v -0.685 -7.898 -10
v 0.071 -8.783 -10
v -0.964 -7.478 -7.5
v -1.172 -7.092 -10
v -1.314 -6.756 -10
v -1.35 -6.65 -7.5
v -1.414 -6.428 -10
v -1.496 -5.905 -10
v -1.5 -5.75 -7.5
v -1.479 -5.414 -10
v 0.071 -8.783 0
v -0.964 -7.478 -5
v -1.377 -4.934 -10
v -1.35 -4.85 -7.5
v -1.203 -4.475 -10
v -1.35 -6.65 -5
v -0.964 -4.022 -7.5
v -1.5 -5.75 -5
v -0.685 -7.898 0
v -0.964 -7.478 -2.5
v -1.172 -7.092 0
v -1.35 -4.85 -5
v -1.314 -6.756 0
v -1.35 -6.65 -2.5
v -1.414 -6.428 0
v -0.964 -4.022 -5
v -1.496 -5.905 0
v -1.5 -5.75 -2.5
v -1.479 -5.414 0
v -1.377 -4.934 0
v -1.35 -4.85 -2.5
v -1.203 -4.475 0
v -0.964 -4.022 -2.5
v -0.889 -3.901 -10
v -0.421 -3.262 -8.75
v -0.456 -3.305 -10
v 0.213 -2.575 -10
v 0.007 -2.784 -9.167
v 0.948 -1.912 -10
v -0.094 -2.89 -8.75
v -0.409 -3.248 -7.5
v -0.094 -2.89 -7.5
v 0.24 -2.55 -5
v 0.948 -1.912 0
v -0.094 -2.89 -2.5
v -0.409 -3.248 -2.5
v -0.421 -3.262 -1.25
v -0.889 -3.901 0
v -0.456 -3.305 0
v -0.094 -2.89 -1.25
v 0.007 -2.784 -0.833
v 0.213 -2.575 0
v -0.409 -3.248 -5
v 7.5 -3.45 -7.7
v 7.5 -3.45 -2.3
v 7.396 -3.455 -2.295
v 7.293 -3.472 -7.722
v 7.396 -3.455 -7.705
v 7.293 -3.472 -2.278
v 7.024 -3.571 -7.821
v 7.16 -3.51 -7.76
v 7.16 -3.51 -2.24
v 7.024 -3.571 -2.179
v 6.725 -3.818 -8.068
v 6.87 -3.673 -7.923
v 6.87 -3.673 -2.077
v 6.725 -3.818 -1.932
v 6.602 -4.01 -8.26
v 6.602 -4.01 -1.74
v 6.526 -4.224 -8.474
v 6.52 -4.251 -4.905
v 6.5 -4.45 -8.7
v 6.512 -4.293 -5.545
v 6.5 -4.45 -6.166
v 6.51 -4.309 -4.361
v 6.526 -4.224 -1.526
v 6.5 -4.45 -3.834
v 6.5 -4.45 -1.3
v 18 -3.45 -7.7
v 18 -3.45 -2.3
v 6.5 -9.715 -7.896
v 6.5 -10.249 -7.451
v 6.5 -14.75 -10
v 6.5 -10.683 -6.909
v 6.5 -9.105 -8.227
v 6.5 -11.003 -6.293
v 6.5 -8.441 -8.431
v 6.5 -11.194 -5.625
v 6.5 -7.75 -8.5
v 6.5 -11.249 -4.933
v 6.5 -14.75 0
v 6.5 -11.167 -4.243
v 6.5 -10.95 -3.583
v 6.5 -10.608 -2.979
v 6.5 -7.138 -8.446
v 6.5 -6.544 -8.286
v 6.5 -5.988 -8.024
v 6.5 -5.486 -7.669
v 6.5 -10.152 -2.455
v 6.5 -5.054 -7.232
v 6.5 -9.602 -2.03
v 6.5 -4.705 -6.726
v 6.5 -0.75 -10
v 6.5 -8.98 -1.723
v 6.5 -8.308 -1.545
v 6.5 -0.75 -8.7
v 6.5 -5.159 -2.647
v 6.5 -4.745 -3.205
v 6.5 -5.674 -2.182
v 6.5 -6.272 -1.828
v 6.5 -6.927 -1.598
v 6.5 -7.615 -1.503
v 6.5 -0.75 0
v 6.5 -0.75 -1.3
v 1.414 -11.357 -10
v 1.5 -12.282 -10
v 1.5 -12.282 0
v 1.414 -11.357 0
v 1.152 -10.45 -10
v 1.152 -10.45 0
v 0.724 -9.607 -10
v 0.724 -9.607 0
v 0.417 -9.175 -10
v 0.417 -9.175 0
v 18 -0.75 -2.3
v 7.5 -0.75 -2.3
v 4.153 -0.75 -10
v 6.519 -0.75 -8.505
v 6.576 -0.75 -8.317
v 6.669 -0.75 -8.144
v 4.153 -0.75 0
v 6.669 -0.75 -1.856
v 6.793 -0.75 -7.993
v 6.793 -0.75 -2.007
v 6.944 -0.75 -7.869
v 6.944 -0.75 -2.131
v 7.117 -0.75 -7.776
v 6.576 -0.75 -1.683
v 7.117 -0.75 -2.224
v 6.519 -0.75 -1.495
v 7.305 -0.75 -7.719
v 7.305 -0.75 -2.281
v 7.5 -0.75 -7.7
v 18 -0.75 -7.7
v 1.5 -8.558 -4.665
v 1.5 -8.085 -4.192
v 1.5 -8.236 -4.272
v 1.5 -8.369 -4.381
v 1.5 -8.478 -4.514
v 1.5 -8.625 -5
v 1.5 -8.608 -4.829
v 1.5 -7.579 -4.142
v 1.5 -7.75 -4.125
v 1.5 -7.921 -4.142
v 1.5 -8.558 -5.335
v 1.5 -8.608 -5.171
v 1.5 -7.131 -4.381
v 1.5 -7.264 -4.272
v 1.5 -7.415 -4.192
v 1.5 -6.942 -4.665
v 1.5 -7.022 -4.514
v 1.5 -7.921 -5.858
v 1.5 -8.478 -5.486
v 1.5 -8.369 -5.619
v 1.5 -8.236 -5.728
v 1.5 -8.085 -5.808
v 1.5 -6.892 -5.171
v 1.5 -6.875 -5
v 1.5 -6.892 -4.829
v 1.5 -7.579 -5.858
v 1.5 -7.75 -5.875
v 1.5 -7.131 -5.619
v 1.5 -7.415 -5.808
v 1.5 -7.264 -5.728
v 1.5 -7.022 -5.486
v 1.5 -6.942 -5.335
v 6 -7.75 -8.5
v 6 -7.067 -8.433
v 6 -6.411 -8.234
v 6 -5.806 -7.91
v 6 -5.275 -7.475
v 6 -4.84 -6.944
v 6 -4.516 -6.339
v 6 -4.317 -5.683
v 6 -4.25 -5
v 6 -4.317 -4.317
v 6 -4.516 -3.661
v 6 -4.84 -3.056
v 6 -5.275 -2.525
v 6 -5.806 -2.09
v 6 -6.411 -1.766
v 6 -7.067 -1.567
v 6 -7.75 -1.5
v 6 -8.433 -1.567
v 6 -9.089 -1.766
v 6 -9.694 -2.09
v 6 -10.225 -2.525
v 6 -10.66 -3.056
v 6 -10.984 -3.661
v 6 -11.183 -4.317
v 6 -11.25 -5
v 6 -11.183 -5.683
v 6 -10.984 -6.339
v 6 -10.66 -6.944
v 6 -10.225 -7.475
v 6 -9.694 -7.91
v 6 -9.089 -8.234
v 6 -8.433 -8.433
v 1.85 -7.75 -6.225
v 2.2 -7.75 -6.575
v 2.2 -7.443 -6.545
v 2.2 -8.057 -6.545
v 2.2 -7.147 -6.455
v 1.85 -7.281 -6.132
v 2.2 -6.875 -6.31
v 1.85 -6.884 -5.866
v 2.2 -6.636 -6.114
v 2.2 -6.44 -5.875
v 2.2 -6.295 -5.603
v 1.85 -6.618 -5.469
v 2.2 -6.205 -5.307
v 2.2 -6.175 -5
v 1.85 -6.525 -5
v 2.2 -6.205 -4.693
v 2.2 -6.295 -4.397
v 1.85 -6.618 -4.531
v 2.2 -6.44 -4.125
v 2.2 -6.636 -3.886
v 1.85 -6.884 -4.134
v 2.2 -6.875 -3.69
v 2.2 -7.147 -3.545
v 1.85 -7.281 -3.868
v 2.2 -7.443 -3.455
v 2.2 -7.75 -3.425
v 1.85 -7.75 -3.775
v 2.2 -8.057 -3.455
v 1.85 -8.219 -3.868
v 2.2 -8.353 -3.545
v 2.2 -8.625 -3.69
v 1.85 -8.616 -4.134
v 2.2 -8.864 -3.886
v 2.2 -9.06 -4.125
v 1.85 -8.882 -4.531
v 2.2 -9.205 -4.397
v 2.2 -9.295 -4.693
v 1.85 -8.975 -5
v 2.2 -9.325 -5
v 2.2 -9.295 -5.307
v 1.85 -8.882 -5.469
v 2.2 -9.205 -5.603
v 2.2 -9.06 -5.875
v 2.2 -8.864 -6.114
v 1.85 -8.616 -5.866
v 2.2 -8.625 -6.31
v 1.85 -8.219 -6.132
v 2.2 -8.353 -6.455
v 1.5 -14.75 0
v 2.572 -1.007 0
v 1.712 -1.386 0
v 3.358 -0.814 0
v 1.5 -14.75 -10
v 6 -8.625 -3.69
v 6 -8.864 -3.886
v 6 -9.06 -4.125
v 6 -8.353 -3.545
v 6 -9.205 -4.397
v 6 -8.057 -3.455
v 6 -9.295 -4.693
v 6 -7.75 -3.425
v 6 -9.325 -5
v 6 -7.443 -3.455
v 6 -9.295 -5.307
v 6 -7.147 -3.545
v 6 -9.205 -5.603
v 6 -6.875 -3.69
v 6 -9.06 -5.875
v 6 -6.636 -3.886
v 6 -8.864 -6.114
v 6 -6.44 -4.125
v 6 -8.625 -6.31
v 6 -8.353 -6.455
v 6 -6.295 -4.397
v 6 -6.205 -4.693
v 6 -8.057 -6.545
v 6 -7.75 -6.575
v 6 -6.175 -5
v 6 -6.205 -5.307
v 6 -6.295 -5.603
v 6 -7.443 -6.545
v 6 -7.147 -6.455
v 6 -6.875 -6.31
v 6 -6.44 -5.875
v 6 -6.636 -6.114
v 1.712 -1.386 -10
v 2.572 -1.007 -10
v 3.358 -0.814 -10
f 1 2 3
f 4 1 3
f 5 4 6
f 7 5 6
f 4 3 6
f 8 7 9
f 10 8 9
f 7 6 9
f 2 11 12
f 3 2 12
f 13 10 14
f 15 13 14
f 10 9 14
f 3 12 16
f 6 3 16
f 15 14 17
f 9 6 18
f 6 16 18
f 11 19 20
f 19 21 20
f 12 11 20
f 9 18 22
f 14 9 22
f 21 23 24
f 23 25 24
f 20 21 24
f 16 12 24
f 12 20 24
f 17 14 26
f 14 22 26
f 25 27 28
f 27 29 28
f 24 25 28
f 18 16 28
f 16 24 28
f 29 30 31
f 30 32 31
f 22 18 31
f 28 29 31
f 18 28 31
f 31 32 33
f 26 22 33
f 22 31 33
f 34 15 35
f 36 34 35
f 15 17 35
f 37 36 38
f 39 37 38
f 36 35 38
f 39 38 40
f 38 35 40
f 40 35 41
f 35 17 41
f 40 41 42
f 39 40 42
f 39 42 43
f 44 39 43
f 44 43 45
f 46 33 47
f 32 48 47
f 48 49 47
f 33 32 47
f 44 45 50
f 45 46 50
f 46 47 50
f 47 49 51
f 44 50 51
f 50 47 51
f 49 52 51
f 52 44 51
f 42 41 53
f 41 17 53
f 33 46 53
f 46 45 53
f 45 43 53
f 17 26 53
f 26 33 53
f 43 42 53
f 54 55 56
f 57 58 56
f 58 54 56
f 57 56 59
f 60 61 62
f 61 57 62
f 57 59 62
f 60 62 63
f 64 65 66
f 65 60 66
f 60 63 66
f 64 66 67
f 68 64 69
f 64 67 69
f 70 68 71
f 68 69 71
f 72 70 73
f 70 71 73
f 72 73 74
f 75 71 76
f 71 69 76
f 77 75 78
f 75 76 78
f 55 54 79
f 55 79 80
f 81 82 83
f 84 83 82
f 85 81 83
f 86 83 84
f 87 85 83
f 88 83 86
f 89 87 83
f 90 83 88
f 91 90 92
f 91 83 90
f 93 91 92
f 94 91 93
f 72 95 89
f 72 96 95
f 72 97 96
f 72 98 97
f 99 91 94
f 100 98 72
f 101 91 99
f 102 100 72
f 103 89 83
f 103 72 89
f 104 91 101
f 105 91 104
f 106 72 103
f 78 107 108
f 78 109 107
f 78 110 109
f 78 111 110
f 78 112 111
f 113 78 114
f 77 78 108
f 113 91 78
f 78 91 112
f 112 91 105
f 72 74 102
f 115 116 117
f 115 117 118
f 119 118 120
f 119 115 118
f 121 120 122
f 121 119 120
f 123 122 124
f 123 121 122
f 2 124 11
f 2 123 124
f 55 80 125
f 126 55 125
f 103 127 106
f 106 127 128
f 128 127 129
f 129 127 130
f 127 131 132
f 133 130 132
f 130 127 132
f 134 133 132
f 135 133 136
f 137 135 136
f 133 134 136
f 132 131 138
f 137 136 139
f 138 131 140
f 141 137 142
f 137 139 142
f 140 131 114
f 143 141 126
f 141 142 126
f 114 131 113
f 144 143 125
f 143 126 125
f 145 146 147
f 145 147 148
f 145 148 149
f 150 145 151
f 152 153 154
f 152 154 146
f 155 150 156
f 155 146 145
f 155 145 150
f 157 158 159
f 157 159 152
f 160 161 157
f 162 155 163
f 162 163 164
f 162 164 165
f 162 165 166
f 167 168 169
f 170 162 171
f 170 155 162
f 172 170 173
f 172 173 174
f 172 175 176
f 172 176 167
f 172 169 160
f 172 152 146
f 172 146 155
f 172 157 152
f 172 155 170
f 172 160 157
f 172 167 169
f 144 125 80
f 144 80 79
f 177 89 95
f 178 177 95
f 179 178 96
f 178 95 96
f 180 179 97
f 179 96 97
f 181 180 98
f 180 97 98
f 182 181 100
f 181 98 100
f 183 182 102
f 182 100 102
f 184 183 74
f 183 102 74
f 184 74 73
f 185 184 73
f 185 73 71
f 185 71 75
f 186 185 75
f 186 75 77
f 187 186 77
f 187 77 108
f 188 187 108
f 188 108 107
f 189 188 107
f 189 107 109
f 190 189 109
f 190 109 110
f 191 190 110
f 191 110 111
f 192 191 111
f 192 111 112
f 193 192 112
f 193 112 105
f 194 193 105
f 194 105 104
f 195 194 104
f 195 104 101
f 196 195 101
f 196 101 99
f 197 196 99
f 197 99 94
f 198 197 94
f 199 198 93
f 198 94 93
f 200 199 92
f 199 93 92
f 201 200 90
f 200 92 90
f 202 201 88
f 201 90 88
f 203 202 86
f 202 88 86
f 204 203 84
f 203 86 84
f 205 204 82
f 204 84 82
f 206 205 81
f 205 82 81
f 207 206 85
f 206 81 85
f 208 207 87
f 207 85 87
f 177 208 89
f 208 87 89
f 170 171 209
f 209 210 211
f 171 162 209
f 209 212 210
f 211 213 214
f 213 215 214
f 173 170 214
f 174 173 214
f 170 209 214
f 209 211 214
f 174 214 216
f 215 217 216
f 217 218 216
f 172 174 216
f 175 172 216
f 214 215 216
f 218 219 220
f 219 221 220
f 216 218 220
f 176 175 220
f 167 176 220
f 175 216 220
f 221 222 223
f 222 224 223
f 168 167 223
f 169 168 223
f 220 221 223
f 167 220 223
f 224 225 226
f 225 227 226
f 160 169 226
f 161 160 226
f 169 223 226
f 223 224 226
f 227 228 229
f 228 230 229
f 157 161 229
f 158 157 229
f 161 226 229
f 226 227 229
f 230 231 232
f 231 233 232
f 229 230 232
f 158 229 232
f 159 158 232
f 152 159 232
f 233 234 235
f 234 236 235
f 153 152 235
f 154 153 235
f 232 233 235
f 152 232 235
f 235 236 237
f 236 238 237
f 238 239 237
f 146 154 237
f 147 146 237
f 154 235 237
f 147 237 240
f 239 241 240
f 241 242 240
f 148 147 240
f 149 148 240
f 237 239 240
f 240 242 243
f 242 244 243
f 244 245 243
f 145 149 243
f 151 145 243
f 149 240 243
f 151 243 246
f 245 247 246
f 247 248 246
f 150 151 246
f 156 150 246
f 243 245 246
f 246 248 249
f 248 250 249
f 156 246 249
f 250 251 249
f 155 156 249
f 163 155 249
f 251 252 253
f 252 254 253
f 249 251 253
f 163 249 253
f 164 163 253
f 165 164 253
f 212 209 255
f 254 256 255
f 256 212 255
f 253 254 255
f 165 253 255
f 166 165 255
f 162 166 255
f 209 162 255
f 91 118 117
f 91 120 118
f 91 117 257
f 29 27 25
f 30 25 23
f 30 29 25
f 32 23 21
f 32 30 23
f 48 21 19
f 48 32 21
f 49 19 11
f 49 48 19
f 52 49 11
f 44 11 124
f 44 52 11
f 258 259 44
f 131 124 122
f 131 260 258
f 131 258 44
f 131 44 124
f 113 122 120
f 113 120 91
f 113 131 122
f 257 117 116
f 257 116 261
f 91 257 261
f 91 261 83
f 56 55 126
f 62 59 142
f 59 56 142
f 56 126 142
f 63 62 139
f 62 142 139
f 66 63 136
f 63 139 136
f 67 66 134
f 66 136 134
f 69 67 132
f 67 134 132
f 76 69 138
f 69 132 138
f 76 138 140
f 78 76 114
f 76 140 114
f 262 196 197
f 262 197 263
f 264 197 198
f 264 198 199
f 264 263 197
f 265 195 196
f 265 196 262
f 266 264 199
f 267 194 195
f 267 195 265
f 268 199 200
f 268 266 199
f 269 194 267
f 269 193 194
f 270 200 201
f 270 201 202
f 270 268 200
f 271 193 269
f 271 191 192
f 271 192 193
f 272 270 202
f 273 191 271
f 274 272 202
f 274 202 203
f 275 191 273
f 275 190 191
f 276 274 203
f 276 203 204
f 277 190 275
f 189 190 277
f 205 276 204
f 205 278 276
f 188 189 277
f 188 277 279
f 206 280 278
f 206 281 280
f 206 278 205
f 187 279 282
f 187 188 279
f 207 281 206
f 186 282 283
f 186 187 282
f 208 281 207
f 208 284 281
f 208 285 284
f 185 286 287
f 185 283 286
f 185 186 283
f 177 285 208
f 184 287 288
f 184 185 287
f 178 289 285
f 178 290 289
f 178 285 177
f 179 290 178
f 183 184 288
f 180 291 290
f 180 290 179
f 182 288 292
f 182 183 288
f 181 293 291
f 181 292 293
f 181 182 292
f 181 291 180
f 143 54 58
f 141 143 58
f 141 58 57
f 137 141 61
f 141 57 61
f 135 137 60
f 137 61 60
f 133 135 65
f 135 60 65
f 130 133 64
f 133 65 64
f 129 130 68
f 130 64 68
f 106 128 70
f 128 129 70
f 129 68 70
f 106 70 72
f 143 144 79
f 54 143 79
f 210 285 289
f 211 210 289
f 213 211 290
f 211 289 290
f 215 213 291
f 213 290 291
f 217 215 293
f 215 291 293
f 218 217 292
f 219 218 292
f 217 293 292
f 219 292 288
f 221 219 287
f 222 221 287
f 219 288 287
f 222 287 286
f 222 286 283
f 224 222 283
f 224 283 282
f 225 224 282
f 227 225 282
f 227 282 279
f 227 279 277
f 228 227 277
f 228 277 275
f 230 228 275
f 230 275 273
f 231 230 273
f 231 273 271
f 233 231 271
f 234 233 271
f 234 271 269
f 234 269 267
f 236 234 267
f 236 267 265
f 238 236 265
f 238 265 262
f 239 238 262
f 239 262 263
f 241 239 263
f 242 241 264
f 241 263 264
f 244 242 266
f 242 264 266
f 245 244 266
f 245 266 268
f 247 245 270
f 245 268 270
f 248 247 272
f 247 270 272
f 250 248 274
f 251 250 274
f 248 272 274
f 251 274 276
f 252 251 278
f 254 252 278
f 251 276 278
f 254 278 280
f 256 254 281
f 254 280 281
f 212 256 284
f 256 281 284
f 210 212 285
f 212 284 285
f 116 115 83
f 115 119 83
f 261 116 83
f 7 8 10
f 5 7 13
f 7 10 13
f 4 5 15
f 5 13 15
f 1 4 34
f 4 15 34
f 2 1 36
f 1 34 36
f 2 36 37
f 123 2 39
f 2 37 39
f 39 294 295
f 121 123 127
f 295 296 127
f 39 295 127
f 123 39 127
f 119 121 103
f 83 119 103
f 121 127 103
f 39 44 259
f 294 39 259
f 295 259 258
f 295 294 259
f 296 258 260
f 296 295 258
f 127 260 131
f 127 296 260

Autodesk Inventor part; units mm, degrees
ref_plane "YZ Plane" through (0, 0, 0) normal (1, 0, 0) x (0, 1, 0)
ref_plane "XZ Plane" through (0, 0, 0) normal (0, 1, 0) x (-1, 0, 0)
ref_plane "XY Plane" through (0, 0, 0) normal (0, 0, 1) x (1, 0, 0)
sketch "Эскиз1" plane through (0, 0, 0) normal (0, 0, 1) x (1, 0, 0)
  spline S0 degree 2 poles (0, -10.75) (-6, -5.75) (0, -0.75) knots -1 -1 -1 0 0 0
  circle A0 centre (31, -8.75) radius 2.1
  circle A1 centre (0.3533, 10.75) radius 2.1
  circle A2 centre (-6.5719, -8.75) radius 2.1
  arc A3 (26, -0.75) -> (0.0249, 0.0543) centre (13, -0.75) ccw
  line L0 (26, -0.75) -> (26, -14.75)
  line L1 (26, -14.75) -> (42.8533, -14.75)
  line L2 (42.8533, -14.75) -> (25.4056, 8.5426)
  arc A4 (25.4056, 8.5426) -> (13, 14.75) centre (13, -0.75) ccw
  line L3 (13, 14.75) -> (-7.8522, 14.75)
  line L4 (-7.8522, 14.75) -> (-8.8, 13.8022)
  arc A5 (-8.8, 13.8022) -> (-9.3554, 12.7353) centre (-7.3858, 12.388) ccw
  line L5 (-9.3554, 12.7353) -> (-9.4563, 12.1627)
  line L6 (-9.4563, 12.1627) -> (-3.6467, 12.1627)
  line L7 (-3.6467, 12.1627) -> (-3.6467, 9.9627)
  line L8 (-3.6467, 9.9627) -> (-9.8443, 9.9627)
  line L9 (-9.8443, 9.9627) -> (-13.8491, -12.75)
  line L10 (-13.8491, -12.75) -> (-7.0093, -12.75)
  line L11 (-7.0093, -12.75) -> (-7.0093, -14.75)
  line L12 (-7.0093, -14.75) -> (0, -14.75)
  line L13 (0, -14.75) -> (0, -11.6512)
  line L14 (1.5, -14.75) -> (26, -14.75)
  line L15 (0.9603, -9.5977) -> (1.5, -10.0794)
  line L16 (1.5, -10.0794) -> (1.5, -14.75)
  line L17 (0.9603, -1.9023) -> (2.3298, -0.75)
  line L18 (2.3298, -0.75) -> (26, -0.75)
  spline S1 degree 3 poles (0.0249, 0.0543) (0.0092, -0.1986) (-0.0544, -0.4464) (-0.2708, -0.9048) (-0.4215, -1.1114) (-0.6069, -1.2843) knots 0 0 0 0 0.5 0.5 1 1 1 1
  spline S2 degree 3 poles (-0.6318, -10.1924) (-0.4418, -10.3706) (-0.2885, -10.5841) (-0.1211, -10.951) (-0.0759, -11.0869) (-0.0153, -11.366) (0, -11.5084) (0, -11.6512) knots 0 0 0 0 0.476947 0.476947 0.738474 0.738474 1 1 1 1
  spline S3 degree 2 poles (-0.6318, -10.1924) (-5.3806, -5.7383) (-0.6069, -1.2843) knots -0.944242 -0.944242 -0.944242 -0.053426 -0.053426 -0.053426
  line L19 (1.5, -14.75) -> (6.5, -14.75)
  line L20 (6.5, -14.75) -> (6.5, -0.75)
  spline S4 degree 5 poles (0.9603, -9.5977) (0.5187, -9.2297) (0.0945, -8.8388) (-0.3025, -8.4229) (-0.9009, -7.6836) (-1.3123, -6.8331) (-1.4364, -6.4831) (-1.5637, -5.75) (-1.4364, -5.0169) (-1.3123, -4.6669) (-0.9009, -3.8164) (-0.3025, -3.0771) (0.0945, -2.6612) (0.5187, -2.2703) (0.9603, -1.9023) knots 0 0 0 0 0 0 0.305403 0.305403 0.305403 0.5 0.5 0.5 0.694597 0.694597 0.694597 1 1 1 1 1 1
  point P0 (0, 0)
  dimension "d0" = 1.5
  dimension "d2" = 1.5
  dimension "d12" = 5
extrude "Выдавливание1" add sketch "Эскиз1" against normal blind 10 contours L20 L14 L16 L15 S4 L17 L18
fillet "Сопряжение2" radius 5 2 edges at (1.5, -10.0794, -5) (2.3298, -0.75, -5)
fillet_without_effect "Сопряжение3"
sketch "Эскиз3" plane through (6.5, -14.75, 0) normal (1, 0, 0) x (0, 0, -1)
  line L0 (0, 0) -> (0, 14) projected
  line L1 (0, 0) -> (10, 0) projected
  line L2 (10, 14) -> (10, 0) projected
  line L3 (0, 14) -> (10, 14) projected
  line L4 (0, 14) -> (10, 14) projected
  line L5 (5, 14) -> (5, 0)
  line L6 (0, 0) -> (10, 0) projected
  circle A0 centre (5, 7) radius 1.575
  point P0 (0, 14.75)
  dimension "d13" = 3.15
extrude "Выдавливание3" cut sketch "Эскиз3" against normal blind 5 contours A0 L5 | L5 A0
chamfer "Фаска1" distance 0.7 angle 45 1 edges at (1.5, -7.75, -3.425)
sketch "Эскиз4" plane through (6.5, -14.75, 0) normal (1, 0, 0) x (0, 0, -1)
  line L0 (9, 14) -> (10, 14) projected
  line L1 (10, 0) -> (10, 14) projected
  line L2 (0, 0) -> (10, 0) projected
  line L3 (0, 14) -> (0, 0) projected
  line L4 (0, 14) -> (1, 14) projected
  circle A0 centre (5, 7) radius 2.1 projected
  line L5 (7.7, 11.3) -> (2.3, 11.3)
  line L6 (2.3, 11.3) -> (2.3, 14.3)
  line L7 (2.3, 14.3) -> (-0.3, 14.3)
  line L8 (-0.3, 14.3) -> (-0.3, -0.3)
  line L9 (-0.3, -0.3) -> (10.3, -0.3)
  line L10 (10.3, -0.3) -> (10.3, 14.3)
  line L11 (10.3, 14.3) -> (7.7, 14.3)
  line L12 (7.7, 14.3) -> (7.7, 11.3)
  line L13 (0, 14) -> (10, 14) projected
  line L14 (1, 10) -> (1, 14) projected
  line L15 (9, 10) -> (1, 10) projected
  line L16 (9, 14) -> (9, 10) projected
  point P0 (0, 14.75)
  point P1 (2, 14)
  point P2 (8, 14)
  point P3 (7.7, 14)
  point P4 (2.3, 14)
extrude "Выдавливание4" add sketch "Эскиз4" along normal blind 11.5 contours L12 L5 L6 L13
fillet "Сопряжение4" radius 1 3 edges at (6.5, -2.1, -7.7) (6.5, -3.45, -5) (6.5, -2.1, -2.3)
sketch "Эскиз5" plane through (6.5, -14.75, 0) normal (1, 0, 0) x (0, 0, -1)
  circle A0 centre (5, 7) radius 1.575 projected
  line L0 (8.7, 10.3) -> (8.7, 14) projected
  line L1 (1.3, 10.3) -> (8.7, 10.3) projected
  line L2 (1.3, 14) -> (1.3, 10.3) projected
  line L3 (0, 14) -> (1.3, 14) projected
  line L4 (0, 0) -> (0, 14) projected
  line L5 (0, 0) -> (10, 0) projected
  line L6 (10, 14) -> (10, 0) projected
  line L7 (8.7, 14) -> (10, 14) projected
  circle A1 centre (5, 7) radius 1.575 projected
  circle A2 centre (5, 7) radius 3.5
  point P0 (0, 14.75)
  point P1 (3.8338, 10.3)
  point P2 (6.1662, 10.3)
  dimension "d23" = 7
extrude "Выдавливание5" cut sketch "Эскиз5" along normal mid plane 1 contours A0 | A2 L1 | L1 A2
properties part number "upor"
